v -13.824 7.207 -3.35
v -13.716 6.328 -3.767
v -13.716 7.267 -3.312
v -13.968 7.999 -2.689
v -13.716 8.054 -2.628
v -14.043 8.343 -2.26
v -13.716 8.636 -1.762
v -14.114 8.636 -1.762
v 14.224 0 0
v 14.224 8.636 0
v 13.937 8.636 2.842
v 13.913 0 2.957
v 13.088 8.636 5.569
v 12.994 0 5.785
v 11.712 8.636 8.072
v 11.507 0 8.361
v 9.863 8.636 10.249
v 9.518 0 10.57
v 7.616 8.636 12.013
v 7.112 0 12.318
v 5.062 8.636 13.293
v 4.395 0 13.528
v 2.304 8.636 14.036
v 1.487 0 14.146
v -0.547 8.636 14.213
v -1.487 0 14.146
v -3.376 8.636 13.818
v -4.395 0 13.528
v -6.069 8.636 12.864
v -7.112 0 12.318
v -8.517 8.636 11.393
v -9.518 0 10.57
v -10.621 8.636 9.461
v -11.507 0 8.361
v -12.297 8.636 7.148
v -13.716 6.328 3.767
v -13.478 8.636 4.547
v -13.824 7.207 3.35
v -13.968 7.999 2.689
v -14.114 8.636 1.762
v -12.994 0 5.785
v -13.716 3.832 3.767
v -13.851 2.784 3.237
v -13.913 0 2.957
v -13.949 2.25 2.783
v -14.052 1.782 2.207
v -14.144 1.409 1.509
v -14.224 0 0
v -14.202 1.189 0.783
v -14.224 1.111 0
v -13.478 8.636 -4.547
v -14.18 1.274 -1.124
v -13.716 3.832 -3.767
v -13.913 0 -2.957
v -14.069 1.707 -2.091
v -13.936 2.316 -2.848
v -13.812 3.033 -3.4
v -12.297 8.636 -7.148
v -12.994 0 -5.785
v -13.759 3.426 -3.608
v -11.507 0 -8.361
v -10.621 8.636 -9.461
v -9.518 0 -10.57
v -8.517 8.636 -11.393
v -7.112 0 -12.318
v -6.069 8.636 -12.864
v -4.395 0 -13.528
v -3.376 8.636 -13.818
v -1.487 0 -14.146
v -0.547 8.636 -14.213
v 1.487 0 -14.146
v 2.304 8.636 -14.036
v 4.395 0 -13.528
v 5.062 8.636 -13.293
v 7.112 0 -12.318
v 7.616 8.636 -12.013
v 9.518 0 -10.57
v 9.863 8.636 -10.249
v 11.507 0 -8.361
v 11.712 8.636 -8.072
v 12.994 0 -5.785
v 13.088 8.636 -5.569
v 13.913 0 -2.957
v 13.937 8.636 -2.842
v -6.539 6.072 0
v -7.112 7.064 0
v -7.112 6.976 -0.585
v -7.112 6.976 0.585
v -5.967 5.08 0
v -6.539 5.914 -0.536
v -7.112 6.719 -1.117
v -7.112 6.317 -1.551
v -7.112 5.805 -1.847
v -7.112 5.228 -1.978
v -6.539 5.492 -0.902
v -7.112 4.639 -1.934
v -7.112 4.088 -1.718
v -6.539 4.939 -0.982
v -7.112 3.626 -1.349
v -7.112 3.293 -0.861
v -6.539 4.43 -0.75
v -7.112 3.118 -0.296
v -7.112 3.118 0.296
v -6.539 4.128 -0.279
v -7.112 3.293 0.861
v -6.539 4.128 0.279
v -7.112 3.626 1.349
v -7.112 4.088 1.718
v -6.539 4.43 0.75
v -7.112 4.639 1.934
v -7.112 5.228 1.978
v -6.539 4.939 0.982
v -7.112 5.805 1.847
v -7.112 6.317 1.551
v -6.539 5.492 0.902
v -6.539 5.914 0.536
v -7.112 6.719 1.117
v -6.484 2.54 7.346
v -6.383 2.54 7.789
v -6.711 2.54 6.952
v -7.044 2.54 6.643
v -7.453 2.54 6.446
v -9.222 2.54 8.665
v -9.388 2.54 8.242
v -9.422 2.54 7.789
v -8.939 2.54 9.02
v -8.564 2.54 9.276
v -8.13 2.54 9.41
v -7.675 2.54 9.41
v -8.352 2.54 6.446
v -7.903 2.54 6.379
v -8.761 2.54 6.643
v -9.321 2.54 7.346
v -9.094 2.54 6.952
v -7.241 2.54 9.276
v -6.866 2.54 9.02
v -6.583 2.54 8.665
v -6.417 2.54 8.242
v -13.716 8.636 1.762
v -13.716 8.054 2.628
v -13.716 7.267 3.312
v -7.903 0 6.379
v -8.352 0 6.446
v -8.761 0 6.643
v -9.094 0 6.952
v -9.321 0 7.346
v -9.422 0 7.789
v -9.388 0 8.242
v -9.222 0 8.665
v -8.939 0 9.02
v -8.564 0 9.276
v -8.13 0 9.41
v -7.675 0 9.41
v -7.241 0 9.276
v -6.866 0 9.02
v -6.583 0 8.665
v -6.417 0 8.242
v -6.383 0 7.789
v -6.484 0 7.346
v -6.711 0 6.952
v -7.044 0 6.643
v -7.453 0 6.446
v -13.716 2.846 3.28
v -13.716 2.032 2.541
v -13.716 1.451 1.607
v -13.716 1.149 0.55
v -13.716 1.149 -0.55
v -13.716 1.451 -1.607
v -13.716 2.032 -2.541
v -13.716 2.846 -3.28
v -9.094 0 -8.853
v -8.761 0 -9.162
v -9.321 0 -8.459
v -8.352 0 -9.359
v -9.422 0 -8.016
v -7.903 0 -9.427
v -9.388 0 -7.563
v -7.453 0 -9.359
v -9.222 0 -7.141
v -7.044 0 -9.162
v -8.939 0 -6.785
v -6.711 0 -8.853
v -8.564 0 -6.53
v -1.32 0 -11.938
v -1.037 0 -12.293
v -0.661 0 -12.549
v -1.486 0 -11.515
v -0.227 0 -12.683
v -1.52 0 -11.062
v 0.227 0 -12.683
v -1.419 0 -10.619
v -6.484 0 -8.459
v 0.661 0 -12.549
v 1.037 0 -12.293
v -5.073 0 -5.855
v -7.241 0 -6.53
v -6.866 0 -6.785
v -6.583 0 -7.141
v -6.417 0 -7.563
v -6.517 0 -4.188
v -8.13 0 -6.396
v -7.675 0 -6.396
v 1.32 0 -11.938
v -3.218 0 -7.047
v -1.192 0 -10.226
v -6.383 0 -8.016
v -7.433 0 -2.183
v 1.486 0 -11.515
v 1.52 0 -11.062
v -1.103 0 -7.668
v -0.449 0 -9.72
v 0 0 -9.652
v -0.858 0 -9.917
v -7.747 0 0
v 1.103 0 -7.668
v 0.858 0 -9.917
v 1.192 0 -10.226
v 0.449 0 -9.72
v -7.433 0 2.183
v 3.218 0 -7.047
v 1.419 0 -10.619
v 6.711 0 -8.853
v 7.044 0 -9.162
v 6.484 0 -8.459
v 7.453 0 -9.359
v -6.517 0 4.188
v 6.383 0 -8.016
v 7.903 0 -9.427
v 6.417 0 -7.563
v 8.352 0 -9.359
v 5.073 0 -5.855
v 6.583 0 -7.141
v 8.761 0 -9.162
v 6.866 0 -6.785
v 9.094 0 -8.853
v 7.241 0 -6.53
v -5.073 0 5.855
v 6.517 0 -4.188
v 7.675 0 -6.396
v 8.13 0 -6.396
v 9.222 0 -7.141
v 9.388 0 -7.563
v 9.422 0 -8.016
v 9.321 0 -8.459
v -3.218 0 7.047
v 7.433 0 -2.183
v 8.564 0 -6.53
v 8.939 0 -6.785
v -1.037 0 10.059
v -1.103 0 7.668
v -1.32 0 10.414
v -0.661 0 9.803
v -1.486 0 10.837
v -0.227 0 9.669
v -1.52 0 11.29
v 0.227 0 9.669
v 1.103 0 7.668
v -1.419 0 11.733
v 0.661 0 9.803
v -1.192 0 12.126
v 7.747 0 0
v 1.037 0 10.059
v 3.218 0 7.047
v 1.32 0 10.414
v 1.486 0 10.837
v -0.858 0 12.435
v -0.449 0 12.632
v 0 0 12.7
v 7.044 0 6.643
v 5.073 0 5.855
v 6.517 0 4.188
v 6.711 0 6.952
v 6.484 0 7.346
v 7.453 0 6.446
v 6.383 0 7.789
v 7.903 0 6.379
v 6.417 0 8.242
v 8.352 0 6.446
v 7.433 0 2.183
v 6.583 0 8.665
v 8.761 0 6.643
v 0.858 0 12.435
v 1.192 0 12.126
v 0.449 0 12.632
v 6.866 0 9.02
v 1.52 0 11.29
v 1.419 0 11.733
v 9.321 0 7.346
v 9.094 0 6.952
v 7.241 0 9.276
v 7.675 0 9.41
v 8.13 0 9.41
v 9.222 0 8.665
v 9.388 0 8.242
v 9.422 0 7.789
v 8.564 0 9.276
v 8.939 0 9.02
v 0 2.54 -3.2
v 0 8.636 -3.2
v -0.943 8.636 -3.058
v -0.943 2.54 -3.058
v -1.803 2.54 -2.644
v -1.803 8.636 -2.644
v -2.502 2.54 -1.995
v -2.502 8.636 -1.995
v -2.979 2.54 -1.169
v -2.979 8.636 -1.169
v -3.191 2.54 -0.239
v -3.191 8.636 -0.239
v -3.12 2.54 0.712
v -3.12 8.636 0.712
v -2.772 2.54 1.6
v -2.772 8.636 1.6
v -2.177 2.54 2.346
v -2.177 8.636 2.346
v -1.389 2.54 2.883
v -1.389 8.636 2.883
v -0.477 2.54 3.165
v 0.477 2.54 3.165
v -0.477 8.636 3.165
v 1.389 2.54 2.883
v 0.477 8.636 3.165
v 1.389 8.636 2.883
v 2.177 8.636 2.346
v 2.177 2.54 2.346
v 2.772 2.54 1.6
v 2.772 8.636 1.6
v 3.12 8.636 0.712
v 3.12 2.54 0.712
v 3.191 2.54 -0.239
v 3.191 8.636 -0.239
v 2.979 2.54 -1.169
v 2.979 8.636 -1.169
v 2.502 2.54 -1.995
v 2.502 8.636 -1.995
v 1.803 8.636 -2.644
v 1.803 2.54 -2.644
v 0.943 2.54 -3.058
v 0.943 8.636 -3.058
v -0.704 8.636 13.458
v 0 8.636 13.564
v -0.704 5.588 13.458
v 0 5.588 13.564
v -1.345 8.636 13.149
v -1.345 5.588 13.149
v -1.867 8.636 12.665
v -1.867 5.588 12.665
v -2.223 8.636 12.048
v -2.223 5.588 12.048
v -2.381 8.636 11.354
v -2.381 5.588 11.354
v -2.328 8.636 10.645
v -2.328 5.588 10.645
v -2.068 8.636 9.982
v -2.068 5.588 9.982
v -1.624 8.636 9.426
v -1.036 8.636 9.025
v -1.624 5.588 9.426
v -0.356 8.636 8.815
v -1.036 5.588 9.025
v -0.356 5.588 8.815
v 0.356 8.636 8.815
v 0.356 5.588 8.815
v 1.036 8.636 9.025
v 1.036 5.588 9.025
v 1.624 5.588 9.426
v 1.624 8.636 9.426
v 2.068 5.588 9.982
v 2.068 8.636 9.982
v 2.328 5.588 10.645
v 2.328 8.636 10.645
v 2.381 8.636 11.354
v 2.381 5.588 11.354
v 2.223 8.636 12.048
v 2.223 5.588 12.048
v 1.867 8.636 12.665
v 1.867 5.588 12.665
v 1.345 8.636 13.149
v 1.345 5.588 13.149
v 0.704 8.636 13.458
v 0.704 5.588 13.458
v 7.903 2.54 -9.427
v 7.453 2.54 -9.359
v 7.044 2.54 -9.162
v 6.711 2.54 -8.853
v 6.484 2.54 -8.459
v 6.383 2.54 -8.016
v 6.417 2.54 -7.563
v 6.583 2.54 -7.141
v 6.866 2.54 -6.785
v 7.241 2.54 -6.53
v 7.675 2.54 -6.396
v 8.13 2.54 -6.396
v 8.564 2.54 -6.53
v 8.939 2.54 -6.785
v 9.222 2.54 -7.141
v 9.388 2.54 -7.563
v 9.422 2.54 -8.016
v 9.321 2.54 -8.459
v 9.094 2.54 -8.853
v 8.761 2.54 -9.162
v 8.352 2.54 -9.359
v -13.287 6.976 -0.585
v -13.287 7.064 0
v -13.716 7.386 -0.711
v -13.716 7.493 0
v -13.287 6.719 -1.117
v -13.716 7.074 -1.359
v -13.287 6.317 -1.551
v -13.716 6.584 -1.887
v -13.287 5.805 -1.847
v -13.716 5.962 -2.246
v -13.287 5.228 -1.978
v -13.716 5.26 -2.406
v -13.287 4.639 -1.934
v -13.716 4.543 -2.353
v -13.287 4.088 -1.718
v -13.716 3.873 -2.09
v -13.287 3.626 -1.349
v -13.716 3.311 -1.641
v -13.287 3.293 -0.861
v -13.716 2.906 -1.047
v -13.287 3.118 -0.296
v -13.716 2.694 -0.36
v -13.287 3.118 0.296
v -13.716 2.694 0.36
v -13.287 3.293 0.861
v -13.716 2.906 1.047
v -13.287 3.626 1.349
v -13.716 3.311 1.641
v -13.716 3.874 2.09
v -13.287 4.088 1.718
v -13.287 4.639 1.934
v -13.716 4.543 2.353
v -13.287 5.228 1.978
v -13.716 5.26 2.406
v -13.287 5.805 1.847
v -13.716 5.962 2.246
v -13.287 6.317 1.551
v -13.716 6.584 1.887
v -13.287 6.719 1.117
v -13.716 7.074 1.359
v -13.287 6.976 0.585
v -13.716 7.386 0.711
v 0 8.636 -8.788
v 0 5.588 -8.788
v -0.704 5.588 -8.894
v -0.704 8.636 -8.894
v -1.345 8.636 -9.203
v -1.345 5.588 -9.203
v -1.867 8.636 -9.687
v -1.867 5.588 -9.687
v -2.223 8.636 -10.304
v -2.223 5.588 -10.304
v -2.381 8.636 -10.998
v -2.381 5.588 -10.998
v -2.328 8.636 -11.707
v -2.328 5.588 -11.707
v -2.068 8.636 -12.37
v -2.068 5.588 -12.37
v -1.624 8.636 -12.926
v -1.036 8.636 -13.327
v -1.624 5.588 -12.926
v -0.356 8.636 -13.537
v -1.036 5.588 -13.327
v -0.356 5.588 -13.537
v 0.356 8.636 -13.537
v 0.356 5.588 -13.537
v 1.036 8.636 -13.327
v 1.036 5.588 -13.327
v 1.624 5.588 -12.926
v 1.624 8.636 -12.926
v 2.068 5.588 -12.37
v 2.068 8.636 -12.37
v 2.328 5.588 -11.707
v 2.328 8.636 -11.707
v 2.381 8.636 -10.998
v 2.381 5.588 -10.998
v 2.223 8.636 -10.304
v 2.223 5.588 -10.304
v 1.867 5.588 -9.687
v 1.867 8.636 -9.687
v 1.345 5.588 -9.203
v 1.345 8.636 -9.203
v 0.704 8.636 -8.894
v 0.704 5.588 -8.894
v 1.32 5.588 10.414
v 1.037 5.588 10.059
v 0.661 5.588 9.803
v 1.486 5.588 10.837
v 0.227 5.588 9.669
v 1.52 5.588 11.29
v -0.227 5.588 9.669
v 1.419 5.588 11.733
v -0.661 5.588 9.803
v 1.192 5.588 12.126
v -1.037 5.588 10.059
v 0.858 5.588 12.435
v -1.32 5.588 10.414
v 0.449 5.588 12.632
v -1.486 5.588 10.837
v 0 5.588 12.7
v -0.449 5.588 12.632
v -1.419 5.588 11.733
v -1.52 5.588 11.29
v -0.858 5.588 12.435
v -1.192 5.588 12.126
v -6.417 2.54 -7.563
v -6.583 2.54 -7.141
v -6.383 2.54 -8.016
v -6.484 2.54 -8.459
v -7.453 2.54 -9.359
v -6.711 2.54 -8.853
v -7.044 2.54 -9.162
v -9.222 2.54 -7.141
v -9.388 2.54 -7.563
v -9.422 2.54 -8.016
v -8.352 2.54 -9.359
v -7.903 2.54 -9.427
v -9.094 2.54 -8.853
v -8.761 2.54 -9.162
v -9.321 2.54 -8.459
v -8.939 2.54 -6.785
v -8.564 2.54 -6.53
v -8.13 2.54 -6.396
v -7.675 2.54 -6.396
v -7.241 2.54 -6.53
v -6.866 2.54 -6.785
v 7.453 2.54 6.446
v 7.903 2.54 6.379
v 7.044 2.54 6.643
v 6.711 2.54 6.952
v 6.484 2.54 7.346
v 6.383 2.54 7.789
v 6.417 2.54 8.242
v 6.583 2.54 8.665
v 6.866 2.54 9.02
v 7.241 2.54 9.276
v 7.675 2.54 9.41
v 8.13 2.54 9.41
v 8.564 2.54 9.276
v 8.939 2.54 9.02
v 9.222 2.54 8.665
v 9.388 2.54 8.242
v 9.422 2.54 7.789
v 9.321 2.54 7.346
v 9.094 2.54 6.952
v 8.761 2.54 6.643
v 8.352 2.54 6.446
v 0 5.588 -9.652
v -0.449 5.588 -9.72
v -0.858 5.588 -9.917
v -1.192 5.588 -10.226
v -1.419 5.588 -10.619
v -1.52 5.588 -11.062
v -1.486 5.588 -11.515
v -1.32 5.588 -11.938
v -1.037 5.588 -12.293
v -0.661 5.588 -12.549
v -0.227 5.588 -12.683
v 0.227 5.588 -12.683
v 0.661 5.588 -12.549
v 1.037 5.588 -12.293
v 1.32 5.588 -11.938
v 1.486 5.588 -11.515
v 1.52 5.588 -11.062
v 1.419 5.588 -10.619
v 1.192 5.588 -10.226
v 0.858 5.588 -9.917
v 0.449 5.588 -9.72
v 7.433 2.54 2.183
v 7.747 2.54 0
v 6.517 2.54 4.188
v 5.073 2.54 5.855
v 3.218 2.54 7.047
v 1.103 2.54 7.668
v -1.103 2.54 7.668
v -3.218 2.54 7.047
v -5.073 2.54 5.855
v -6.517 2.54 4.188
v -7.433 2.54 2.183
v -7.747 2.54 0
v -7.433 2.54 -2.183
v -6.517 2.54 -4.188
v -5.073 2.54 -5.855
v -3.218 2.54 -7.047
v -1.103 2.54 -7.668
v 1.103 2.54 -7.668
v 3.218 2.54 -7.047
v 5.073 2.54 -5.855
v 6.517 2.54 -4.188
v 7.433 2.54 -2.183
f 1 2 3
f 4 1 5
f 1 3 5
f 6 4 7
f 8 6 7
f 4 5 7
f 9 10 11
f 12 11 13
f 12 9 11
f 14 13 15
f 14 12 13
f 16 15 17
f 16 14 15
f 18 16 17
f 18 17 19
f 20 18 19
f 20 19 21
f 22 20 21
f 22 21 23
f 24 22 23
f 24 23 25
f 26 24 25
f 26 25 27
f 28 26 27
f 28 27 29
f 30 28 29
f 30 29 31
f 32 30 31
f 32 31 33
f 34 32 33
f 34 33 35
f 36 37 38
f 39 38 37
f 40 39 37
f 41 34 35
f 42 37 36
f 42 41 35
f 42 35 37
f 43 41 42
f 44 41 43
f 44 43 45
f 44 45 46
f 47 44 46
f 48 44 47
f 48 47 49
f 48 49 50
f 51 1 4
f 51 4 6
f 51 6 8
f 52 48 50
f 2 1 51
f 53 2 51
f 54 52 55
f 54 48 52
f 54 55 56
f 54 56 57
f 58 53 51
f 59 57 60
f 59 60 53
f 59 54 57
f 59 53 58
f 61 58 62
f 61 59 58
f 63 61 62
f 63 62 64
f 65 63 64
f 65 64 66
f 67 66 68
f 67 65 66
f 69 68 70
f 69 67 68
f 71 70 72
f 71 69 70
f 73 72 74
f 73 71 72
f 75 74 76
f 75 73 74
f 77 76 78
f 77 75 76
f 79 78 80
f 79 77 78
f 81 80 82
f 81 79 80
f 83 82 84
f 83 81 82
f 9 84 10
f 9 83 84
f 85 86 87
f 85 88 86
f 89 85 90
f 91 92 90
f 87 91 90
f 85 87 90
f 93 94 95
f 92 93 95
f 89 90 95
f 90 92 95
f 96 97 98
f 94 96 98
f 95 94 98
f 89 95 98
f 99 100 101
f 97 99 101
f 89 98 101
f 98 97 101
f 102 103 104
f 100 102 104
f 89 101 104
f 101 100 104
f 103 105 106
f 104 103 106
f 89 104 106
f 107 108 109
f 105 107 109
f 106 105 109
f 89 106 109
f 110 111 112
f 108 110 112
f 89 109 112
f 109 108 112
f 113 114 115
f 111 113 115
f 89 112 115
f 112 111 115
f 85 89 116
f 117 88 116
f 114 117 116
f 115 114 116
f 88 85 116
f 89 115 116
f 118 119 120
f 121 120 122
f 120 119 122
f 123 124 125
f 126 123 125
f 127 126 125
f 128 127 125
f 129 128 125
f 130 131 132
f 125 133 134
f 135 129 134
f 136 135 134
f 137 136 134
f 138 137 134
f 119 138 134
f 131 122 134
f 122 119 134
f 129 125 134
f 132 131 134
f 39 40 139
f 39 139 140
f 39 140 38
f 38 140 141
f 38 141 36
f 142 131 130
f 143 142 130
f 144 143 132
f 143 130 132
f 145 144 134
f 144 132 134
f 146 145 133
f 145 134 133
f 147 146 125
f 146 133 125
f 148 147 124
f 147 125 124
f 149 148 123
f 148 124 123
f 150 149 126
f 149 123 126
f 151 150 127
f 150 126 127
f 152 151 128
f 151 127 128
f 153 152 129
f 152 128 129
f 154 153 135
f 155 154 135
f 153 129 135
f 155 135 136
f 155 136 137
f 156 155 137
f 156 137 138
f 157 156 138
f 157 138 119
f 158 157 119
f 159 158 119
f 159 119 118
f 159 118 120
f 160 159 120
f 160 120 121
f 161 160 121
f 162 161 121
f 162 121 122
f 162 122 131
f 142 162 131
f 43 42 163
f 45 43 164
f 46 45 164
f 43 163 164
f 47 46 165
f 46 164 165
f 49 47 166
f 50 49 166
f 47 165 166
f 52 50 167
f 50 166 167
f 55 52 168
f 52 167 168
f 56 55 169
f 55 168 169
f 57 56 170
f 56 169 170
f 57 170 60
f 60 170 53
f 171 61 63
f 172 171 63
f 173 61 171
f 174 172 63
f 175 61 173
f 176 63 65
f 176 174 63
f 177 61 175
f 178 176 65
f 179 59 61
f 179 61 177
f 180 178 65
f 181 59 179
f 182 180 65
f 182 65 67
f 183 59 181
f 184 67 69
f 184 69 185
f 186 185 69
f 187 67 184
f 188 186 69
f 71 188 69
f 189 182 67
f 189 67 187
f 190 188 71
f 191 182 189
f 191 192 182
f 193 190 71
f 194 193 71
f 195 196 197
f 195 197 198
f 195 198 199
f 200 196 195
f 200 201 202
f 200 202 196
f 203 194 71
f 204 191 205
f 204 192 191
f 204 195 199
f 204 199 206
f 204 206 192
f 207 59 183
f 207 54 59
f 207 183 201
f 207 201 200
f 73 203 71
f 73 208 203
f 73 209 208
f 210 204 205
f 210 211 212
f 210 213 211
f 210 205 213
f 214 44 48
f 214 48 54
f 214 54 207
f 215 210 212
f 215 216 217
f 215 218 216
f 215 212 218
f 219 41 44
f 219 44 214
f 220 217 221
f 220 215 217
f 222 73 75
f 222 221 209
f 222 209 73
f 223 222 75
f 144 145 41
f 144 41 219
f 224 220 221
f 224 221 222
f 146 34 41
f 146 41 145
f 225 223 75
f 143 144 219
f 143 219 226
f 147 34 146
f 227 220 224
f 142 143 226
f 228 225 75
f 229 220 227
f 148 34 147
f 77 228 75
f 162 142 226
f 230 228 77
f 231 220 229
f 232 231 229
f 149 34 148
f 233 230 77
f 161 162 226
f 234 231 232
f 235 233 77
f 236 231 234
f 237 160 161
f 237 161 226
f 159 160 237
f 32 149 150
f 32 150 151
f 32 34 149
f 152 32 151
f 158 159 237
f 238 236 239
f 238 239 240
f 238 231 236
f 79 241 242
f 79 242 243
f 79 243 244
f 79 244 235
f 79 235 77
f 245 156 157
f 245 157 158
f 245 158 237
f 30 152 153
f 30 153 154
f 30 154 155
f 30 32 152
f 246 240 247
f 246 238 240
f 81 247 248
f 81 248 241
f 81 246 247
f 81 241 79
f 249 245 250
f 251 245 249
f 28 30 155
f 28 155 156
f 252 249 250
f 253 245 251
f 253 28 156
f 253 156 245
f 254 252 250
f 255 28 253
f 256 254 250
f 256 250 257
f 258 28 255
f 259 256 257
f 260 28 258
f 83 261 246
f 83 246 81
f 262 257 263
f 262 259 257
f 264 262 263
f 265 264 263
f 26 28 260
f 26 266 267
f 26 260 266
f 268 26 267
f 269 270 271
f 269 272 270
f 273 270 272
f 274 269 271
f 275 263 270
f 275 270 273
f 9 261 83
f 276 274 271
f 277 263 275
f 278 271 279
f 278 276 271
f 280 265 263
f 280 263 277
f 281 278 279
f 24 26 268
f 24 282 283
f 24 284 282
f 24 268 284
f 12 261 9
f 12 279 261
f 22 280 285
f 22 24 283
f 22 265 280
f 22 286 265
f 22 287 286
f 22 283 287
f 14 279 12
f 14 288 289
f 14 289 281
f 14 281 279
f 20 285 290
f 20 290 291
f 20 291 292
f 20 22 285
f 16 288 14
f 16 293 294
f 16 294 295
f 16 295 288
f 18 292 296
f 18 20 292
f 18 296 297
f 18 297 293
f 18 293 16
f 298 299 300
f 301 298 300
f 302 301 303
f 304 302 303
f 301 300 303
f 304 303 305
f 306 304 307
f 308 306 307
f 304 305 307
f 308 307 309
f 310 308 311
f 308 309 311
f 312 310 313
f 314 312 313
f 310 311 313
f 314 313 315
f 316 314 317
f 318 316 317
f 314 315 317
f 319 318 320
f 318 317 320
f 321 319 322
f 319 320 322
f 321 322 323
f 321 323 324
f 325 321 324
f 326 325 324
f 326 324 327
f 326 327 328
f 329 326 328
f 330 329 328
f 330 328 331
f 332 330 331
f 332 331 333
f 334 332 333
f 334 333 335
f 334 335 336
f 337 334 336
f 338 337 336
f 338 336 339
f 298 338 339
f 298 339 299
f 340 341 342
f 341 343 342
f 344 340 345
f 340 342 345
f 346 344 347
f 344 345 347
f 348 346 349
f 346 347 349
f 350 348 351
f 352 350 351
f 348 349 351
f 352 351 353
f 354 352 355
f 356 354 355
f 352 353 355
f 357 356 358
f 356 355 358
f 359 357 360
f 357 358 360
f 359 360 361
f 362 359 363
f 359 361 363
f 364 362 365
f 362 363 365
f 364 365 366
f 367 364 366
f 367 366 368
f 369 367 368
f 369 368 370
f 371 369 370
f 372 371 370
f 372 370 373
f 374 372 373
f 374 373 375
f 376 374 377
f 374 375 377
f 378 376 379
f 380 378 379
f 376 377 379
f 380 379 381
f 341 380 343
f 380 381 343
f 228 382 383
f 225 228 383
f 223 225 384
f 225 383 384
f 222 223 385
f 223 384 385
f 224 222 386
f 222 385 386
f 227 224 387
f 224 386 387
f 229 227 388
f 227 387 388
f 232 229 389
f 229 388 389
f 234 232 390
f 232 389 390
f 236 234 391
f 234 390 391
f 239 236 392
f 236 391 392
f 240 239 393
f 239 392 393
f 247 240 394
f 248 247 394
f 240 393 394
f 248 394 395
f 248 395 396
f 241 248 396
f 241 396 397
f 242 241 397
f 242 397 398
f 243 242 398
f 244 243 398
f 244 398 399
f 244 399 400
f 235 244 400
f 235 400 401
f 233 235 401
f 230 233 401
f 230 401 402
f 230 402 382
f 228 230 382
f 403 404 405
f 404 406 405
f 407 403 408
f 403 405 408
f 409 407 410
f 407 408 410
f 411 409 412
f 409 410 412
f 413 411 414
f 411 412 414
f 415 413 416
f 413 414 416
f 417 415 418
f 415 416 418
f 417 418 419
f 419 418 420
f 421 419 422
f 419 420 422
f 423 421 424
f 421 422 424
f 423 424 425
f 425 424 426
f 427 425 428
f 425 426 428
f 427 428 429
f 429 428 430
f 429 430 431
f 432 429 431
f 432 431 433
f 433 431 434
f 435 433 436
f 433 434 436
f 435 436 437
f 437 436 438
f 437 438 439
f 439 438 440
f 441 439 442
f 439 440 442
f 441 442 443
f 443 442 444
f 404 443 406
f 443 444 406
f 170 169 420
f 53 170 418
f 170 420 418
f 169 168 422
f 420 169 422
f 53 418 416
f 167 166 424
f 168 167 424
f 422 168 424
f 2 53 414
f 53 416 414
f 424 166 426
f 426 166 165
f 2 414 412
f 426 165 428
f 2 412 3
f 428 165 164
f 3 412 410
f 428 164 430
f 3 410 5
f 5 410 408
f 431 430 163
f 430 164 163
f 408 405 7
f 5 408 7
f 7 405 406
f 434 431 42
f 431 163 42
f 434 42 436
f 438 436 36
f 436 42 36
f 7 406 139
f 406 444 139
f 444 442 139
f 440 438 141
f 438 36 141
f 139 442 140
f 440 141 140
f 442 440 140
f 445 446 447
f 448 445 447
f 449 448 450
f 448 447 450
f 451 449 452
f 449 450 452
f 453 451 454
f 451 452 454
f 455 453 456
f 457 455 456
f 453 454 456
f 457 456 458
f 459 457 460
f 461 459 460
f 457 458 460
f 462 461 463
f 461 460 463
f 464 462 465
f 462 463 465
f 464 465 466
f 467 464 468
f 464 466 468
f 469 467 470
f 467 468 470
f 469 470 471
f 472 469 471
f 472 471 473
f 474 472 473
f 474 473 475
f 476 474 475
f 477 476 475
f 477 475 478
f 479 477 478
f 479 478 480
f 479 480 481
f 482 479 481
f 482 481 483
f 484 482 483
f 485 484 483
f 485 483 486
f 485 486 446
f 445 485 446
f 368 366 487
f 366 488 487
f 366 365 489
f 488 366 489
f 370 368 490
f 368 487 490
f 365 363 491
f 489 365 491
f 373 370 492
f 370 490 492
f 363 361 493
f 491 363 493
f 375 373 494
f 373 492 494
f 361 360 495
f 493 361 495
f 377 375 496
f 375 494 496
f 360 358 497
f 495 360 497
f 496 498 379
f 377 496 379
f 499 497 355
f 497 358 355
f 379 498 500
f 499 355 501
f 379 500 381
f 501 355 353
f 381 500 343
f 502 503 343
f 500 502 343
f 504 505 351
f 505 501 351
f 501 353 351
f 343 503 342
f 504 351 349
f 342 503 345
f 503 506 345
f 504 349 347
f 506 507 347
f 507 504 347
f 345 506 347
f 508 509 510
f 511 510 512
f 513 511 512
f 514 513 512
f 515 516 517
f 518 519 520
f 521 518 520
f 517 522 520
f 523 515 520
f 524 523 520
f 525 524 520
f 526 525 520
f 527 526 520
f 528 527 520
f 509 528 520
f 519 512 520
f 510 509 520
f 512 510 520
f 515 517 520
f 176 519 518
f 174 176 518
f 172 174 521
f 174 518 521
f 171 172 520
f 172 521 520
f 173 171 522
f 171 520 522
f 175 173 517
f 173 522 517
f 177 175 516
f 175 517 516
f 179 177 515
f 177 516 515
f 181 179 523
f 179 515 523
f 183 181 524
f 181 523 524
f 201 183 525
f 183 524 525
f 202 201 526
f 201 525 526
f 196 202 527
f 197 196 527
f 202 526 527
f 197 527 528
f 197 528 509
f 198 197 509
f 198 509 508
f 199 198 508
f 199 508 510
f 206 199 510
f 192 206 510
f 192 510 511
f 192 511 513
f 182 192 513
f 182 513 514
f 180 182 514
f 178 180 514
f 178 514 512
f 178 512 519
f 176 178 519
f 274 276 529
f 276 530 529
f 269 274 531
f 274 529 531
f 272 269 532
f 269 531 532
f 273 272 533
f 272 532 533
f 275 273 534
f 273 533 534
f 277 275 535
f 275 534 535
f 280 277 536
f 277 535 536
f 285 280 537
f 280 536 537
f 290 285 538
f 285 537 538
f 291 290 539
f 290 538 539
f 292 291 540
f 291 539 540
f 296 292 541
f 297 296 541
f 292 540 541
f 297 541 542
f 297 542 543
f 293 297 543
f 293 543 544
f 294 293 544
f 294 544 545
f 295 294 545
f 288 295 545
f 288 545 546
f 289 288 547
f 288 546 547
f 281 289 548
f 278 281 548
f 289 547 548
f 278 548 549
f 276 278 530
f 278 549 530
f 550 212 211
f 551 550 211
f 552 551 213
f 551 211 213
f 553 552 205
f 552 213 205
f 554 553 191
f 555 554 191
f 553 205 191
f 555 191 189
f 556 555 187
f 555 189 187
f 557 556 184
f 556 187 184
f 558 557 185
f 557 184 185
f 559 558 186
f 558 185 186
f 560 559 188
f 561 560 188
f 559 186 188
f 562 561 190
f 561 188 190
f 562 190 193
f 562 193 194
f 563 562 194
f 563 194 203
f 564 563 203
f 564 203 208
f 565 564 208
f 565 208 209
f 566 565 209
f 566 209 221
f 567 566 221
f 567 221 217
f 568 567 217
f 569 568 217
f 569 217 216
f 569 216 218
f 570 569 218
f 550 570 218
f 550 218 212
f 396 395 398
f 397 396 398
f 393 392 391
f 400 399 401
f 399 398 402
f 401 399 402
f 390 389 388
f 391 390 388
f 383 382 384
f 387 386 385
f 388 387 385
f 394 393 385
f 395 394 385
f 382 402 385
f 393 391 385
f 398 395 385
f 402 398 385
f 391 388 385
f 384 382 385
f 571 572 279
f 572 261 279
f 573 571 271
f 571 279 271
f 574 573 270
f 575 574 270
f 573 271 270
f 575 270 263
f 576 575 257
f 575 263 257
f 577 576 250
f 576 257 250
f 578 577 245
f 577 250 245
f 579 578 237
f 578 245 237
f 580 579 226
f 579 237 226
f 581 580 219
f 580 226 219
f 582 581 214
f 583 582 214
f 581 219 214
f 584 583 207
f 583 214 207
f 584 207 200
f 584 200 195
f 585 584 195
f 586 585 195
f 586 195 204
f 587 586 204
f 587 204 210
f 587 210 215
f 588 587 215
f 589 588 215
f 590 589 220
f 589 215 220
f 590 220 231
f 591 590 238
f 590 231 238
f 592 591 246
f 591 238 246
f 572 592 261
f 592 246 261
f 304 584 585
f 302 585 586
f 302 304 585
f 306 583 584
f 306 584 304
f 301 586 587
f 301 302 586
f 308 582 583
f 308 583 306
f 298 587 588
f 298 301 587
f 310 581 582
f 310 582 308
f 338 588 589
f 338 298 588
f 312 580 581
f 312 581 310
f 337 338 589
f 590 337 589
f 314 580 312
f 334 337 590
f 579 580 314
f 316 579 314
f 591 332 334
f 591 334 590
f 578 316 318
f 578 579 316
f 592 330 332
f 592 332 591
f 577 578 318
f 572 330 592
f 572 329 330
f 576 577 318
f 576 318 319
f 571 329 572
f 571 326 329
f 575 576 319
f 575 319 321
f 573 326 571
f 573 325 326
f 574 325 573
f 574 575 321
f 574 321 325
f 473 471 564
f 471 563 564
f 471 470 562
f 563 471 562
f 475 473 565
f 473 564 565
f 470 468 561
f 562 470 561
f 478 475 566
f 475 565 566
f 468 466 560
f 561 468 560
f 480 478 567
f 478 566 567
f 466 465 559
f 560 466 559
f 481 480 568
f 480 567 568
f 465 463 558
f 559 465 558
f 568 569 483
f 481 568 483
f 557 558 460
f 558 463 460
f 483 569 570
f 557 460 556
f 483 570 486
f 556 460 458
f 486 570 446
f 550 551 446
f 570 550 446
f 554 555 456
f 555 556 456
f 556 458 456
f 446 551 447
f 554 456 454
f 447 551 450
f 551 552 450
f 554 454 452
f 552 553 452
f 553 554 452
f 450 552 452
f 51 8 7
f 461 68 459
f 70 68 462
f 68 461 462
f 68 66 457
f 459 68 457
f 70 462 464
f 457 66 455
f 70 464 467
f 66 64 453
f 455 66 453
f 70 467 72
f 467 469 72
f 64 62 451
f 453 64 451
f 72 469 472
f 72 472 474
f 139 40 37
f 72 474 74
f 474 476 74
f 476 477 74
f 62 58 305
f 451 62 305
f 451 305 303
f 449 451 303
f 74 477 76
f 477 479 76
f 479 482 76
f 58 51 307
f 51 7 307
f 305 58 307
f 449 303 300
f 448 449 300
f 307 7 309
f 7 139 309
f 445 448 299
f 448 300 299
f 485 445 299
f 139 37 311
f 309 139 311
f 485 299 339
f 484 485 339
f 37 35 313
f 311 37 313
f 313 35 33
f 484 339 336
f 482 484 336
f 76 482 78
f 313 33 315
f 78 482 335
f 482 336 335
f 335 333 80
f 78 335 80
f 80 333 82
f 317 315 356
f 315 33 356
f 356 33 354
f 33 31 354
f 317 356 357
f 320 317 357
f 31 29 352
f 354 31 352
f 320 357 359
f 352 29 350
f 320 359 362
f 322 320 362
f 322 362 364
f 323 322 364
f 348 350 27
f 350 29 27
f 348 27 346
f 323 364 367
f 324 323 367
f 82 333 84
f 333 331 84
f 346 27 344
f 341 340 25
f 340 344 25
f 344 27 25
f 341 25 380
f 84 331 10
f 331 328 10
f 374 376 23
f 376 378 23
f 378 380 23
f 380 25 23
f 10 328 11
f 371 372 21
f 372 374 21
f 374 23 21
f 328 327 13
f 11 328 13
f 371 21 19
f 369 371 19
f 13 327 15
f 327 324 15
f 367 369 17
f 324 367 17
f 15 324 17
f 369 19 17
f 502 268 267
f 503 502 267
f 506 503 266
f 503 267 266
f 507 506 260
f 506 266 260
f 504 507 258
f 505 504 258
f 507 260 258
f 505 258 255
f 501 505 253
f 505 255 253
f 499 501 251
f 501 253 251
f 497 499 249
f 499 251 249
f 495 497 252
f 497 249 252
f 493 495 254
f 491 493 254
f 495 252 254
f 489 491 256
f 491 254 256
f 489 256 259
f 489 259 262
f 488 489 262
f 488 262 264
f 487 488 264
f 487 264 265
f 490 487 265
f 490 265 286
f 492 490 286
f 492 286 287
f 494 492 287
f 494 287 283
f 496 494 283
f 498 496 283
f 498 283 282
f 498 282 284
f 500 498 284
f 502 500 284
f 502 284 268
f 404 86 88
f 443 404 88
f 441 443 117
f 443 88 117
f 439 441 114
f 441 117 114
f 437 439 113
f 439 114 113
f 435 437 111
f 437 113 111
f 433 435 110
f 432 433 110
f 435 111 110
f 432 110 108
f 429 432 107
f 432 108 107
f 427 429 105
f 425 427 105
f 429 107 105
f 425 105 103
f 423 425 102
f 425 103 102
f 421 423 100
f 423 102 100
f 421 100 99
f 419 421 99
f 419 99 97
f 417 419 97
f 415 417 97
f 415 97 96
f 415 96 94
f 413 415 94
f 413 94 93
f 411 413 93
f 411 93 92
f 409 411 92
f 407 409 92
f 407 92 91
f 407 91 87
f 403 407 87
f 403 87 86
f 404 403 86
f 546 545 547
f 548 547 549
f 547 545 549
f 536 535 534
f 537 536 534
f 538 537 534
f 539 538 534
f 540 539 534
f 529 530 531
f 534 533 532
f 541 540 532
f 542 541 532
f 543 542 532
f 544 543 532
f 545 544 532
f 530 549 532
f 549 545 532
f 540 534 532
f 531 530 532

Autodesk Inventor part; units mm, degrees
sketch "Sketch_1" plane through (0, 0, 0) normal (0, 0, 1) x (1, 0, 0)
  line L0 (0, 0) -> (0, 8.636)
  line L1 (0, 8.636) -> (14.224, 8.636)
  line L2 (14.224, 8.636) -> (14.224, 0)
  line L3 (14.224, 0) -> (0, 0)
  line L4 (0, 0) -> (0, 8.636)
revolve "Revolution1" add sketch "Sketch_1" angle 360 about axis through (0, 0, 0) along (0, -1, 0)
sketch "Sketch_37" plane through (0, 0, 0) normal (0, 0, 1) x (1, 0, 0)
  line L0 (-5.9667, 5.08) -> (-14.224, 5.08)
  line L1 (-14.224, 5.08) -> (-14.224, 9.0488)
  line L2 (-14.224, 9.0488) -> (-13.716, 9.0488)
  line L3 (-13.716, 9.0488) -> (-13.716, 7.493)
  line L4 (-13.716, 7.493) -> (-13.2867, 7.0637)
  line L5 (-13.2867, 7.0637) -> (-7.112, 7.0637)
  line L6 (-7.112, 7.0637) -> (-5.9667, 5.08)
  line L7 (-5.9667, 5.08) -> (-14.224, 5.08)
revolve "Revolution2" cut sketch "Sketch_37" angle 360 about axis through (-5.9667, 5.08, 0) along (1, 0, 0)
thread "Thread1" size "10-32 UNF" class "2B" standard "ANSI Unified Screw Threads" length 5.08 offset 1.524
sketch "Sketch3" plane through (0, 0, 0) normal (0, -1, 0) x (1, 0, 0)
  point P0 (0, 0)
hole "Hole1" at (0, 0, 0) direction (0, 1, 0) diameter 6.4008 depth 8.636
sketch "Sketch_9" plane through (0, 0, 0) normal (0, 0, 1) x (1, 0, 0)
  line L0 (0, 0) -> (0, 2.54)
  line L1 (0, 2.54) -> (7.747, 2.54)
  line L2 (7.747, 2.54) -> (7.747, 0)
  line L3 (7.747, 0) -> (0, 0)
  line L4 (0, 0) -> (0, 2.54)
revolve "Revolution3" cut sketch "Sketch_9" angle 360 about axis through (0, 0, 0) along (0, -1, 0)
sketch "Sketch5" plane through (0, 8.636, 0) normal (0, 1, 0) x (1, 0, 0)
  point P0 (0, -11.176)
hole "Hole2" at (0, 8.636, 11.176) direction (0, -1, 0) diameter 3.048 depth 8.636 counterbore diameter 4.7752 counterbore depth 3.048
sketch "Sketch6" plane through (0, 8.636, 0) normal (0, 1, 0) x (1, 0, 0)
  point P0 (0, 11.176)
hole "Hole3" at (0, 8.636, -11.176) direction (0, -1, 0) diameter 3.048 depth 8.636 counterbore diameter 4.7752 counterbore depth 3.048
sketch "Sketch7" plane through (0, 0, 0) normal (0, -1, 0) x (1, 0, 0)
  point P0 (-7.9026, 7.9026)
hole "Hole4" at (-7.9026, 0, 7.9026) direction (0, 1, 0) diameter 3.048 depth 2.54
sketch "Sketch8" plane through (0, 0, 0) normal (0, -1, 0) x (1, 0, 0)
  point P0 (7.9026, 7.9026)
hole "Hole5" at (7.9026, 0, 7.9026) direction (0, 1, 0) diameter 3.048 depth 2.54
sketch "Sketch9" plane through (0, 0, 0) normal (0, -1, 0) x (1, 0, 0)
  point P0 (7.9026, -7.9026)
hole "Hole6" at (7.9026, 0, -7.9026) direction (0, 1, 0) diameter 3.048 depth 2.54
sketch "Sketch10" plane through (0, 0, 0) normal (0, -1, 0) x (1, 0, 0)
  point P0 (-7.9026, -7.9026)
hole "Hole7" at (-7.9026, 0, -7.9026) direction (0, 1, 0) diameter 3.048 depth 2.54
ref_plane "a1_XY" through (0, 8.636, -14.224) normal (0, 1, 0) x (1, 0, 0)
ref_plane "a1_YZ" through (0, 8.636, -14.224) normal (1, 0, 0) x (0, 0, -1)
ref_plane "a1_ZX" through (0, 8.636, -14.224) normal (0, 0, -1) x (0, 1, 0)
ref_plane "a2_XY" through (0, 8.636, 14.224) normal (0, 1, 0) x (1, 0, 0)
ref_plane "a2_YZ" through (0, 8.636, 14.224) normal (1, 0, 0) x (0, 0, -1)
ref_plane "a2_ZX" through (0, 8.636, 14.224) normal (0, 0, -1) x (0, 1, 0)
ref_plane "ar3_XY" through (-7.9026, 2.54, 7.9026) normal (0, 1, 0) x (1, 0, 0)
ref_plane "ar3_YZ" through (-7.9026, 2.54, 7.9026) normal (1, 0, 0) x (0, 0, -1)
ref_plane "ar3_ZX" through (-7.9026, 2.54, 7.9026) normal (0, 0, -1) x (0, 1, 0)
ref_plane "ar4_XY" through (7.9026, 2.54, 7.9026) normal (0, 1, 0) x (1, 0, 0)
ref_plane "ar4_YZ" through (7.9026, 2.54, 7.9026) normal (1, 0, 0) x (0, 0, -1)
ref_plane "ar4_ZX" through (7.9026, 2.54, 7.9026) normal (0, 0, -1) x (0, 1, 0)
ref_plane "ar5_XY" through (7.9026, 2.54, -7.9026) normal (0, 1, 0) x (1, 0, 0)
ref_plane "ar5_YZ" through (7.9026, 2.54, -7.9026) normal (1, 0, 0) x (0, 0, -1)
ref_plane "ar5_ZX" through (7.9026, 2.54, -7.9026) normal (0, 0, -1) x (0, 1, 0)
ref_plane "ar6_XY" through (-7.9026, 2.54, -7.9026) normal (0, 1, 0) x (1, 0, 0)
ref_plane "ar6_YZ" through (-7.9026, 2.54, -7.9026) normal (1, 0, 0) x (0, 0, -1)
ref_plane "ar6_ZX" through (-7.9026, 2.54, -7.9026) normal (0, 0, -1) x (0, 1, 0)
ref_plane "b1_XY" through (0, 8.636, 0) normal (0, 1, 0) x (1, 0, 0)
ref_plane "b1_YZ" through (0, 8.636, 0) normal (1, 0, 0) x (0, 0, -1)
ref_plane "b1_ZX" through (0, 8.636, 0) normal (0, 0, -1) x (0, 1, 0)
ref_plane "c1_XY" through (0, 8.636, -11.176) normal (0, 1, 0) x (1, 0, 0)
ref_plane "c1_YZ" through (0, 8.636, -11.176) normal (1, 0, 0) x (0, 0, -1)
ref_plane "c1_ZX" through (0, 8.636, -11.176) normal (0, 0, -1) x (0, 1, 0)
ref_plane "c2_XY" through (0, 8.636, 11.176) normal (0, 1, 0) x (1, 0, 0)
ref_plane "c2_YZ" through (0, 8.636, 11.176) normal (1, 0, 0) x (0, 0, -1)
ref_plane "c2_ZX" through (0, 8.636, 11.176) normal (0, 0, -1) x (0, 1, 0)
ref_plane "d1_XY" through (-1.524, 8.636, -11.176) normal (0, 1, 0) x (1, 0, 0)
ref_plane "d1_YZ" through (-1.524, 8.636, -11.176) normal (1, 0, 0) x (0, 0, -1)
ref_plane "d1_ZX" through (-1.524, 8.636, -11.176) normal (0, 0, -1) x (0, 1, 0)
ref_plane "d2_XY" through (1.524, 8.636, -11.176) normal (0, 1, 0) x (1, 0, 0)
ref_plane "d2_YZ" through (1.524, 8.636, -11.176) normal (1, 0, 0) x (0, 0, -1)
ref_plane "d2_ZX" through (1.524, 8.636, -11.176) normal (0, 0, -1) x (0, 1, 0)
ref_plane "j_XY" through (0, 0, 0) normal (0, 1, 0) x (1, 0, 0)
ref_plane "j_YZ" through (0, 0, 0) normal (1, 0, 0) x (0, 0, -1)
ref_plane "j_ZX" through (0, 0, 0) normal (0, 0, -1) x (0, 1, 0)
ref_plane "k1_XY" through (-14.224, 5.08, 0) normal (0, 0, 1) x (1, 0, 0)
ref_plane "k1_YZ" through (-14.224, 5.08, 0) normal (1, 0, 0) x (0, 1, 0)
ref_plane "k1_ZX" through (-14.224, 5.08, 0) normal (0, 1, 0) x (0, 0, 1)
ref_plane "k2_XY" through (-14.224, 8.636, 0) normal (0, 0, 1) x (1, 0, 0)
ref_plane "k2_YZ" through (-14.224, 8.636, 0) normal (1, 0, 0) x (0, 1, 0)
ref_plane "k2_ZX" through (-14.224, 8.636, 0) normal (0, 1, 0) x (0, 0, 1)
ref_plane "l1_XY" through (-14.224, 7.493, 0) normal (0, 0, 1) x (1, 0, 0)
ref_plane "l1_YZ" through (-14.224, 7.493, 0) normal (1, 0, 0) x (0, 1, 0)
ref_plane "l1_ZX" through (-14.224, 7.493, 0) normal (0, 1, 0) x (0, 0, 1)
ref_plane "l2_XY" through (-14.224, 2.667, 0) normal (0, 0, 1) x (1, 0, 0)
ref_plane "l2_YZ" through (-14.224, 2.667, 0) normal (1, 0, 0) x (0, 1, 0)
ref_plane "l2_ZX" through (-14.224, 2.667, 0) normal (0, 1, 0) x (0, 0, 1)
ref_plane "rg_XY" through (0, 8.636, 0) normal (0, 1, 0) x (1, 0, 0)
ref_plane "rg_YZ" through (0, 8.636, 0) normal (1, 0, 0) x (0, 0, -1)
ref_plane "rg_ZX" through (0, 8.636, 0) normal (0, 0, -1) x (0, 1, 0)
ref_plane "rh_XY" through (0, 8.636, 0) normal (0, 1, 0) x (1, 0, 0)
ref_plane "rh_YZ" through (0, 8.636, 0) normal (1, 0, 0) x (0, 0, -1)
ref_plane "rh_ZX" through (0, 8.636, 0) normal (0, 0, -1) x (0, 1, 0)
ref_plane "to_dummy_XY" through (0, 8.636, 0) normal (0, 1, 0) x (1, 0, 0)
ref_plane "to_dummy_YZ" through (0, 8.636, 0) normal (1, 0, 0) x (0, 0, -1)
ref_plane "to_dummy_ZX" through (0, 8.636, 0) normal (0, 0, -1) x (0, 1, 0)
ref_plane "to_nut_XY" through (0, 10.16, 0) normal (0, 1, 0) x (1, 0, 0)
ref_plane "to_nut_YZ" through (0, 10.16, 0) normal (1, 0, 0) x (0, 0, -1)
ref_plane "to_nut_ZX" through (0, 10.16, 0) normal (0, 0, -1) x (0, 1, 0)
ref_plane "to_rod_XY" through (0, 8.636, 0) normal (0, 1, 0) x (1, 0, 0)
ref_plane "to_rod_YZ" through (0, 8.636, 0) normal (1, 0, 0) x (0, 0, -1)
ref_plane "to_rod_ZX" through (0, 8.636, 0) normal (0, 0, -1) x (0, 1, 0)
ref_plane "to_tube_XY" through (0, 2.54, 0) normal (0, 1, 0) x (1, 0, 0)
ref_plane "to_tube_YZ" through (0, 2.54, 0) normal (1, 0, 0) x (0, 0, -1)
ref_plane "to_tube_ZX" through (0, 2.54, 0) normal (0, 0, -1) x (0, 1, 0)
ref_plane "to_wiper_XY" through (0, 8.636, 0) normal (0, 1, 0) x (1, 0, 0)
ref_plane "to_wiper_YZ" through (0, 8.636, 0) normal (1, 0, 0) x (0, 0, -1)
ref_plane "to_wiper_ZX" through (0, 8.636, 0) normal (0, 0, -1) x (0, 1, 0)
ref_plane "track1_XY" through (-7.874, 0, 0) normal (0, 1, 0) x (1, 0, 0)
ref_plane "track1_YZ" through (-7.874, 0, 0) normal (1, 0, 0) x (0, 0, -1)
ref_plane "track1_ZX" through (-7.874, 0, 0) normal (0, 0, -1) x (0, 1, 0)
ref_plane "track2_XY" through (0, 0, -7.874) normal (0, 1, 0) x (1, 0, 0)
ref_plane "track2_YZ" through (0, 0, -7.874) normal (1, 0, 0) x (0, 0, -1)
ref_plane "track2_ZX" through (0, 0, -7.874) normal (0, 0, -1) x (0, 1, 0)
ref_plane "track3_XY" through (7.874, 0, 0) normal (0, 1, 0) x (1, 0, 0)
ref_plane "track3_YZ" through (7.874, 0, 0) normal (1, 0, 0) x (0, 0, -1)
ref_plane "track3_ZX" through (7.874, 0, 0) normal (0, 0, -1) x (0, 1, 0)
ref_plane "track4_XY" through (0, 0, 7.874) normal (0, 1, 0) x (1, 0, 0)
ref_plane "track4_YZ" through (0, 0, 7.874) normal (1, 0, 0) x (0, 0, -1)
ref_plane "track4_ZX" through (0, 0, 7.874) normal (0, 0, -1) x (0, 1, 0)
properties part number "02-1-0.13-FO1_BM_heads" material "Steel"
